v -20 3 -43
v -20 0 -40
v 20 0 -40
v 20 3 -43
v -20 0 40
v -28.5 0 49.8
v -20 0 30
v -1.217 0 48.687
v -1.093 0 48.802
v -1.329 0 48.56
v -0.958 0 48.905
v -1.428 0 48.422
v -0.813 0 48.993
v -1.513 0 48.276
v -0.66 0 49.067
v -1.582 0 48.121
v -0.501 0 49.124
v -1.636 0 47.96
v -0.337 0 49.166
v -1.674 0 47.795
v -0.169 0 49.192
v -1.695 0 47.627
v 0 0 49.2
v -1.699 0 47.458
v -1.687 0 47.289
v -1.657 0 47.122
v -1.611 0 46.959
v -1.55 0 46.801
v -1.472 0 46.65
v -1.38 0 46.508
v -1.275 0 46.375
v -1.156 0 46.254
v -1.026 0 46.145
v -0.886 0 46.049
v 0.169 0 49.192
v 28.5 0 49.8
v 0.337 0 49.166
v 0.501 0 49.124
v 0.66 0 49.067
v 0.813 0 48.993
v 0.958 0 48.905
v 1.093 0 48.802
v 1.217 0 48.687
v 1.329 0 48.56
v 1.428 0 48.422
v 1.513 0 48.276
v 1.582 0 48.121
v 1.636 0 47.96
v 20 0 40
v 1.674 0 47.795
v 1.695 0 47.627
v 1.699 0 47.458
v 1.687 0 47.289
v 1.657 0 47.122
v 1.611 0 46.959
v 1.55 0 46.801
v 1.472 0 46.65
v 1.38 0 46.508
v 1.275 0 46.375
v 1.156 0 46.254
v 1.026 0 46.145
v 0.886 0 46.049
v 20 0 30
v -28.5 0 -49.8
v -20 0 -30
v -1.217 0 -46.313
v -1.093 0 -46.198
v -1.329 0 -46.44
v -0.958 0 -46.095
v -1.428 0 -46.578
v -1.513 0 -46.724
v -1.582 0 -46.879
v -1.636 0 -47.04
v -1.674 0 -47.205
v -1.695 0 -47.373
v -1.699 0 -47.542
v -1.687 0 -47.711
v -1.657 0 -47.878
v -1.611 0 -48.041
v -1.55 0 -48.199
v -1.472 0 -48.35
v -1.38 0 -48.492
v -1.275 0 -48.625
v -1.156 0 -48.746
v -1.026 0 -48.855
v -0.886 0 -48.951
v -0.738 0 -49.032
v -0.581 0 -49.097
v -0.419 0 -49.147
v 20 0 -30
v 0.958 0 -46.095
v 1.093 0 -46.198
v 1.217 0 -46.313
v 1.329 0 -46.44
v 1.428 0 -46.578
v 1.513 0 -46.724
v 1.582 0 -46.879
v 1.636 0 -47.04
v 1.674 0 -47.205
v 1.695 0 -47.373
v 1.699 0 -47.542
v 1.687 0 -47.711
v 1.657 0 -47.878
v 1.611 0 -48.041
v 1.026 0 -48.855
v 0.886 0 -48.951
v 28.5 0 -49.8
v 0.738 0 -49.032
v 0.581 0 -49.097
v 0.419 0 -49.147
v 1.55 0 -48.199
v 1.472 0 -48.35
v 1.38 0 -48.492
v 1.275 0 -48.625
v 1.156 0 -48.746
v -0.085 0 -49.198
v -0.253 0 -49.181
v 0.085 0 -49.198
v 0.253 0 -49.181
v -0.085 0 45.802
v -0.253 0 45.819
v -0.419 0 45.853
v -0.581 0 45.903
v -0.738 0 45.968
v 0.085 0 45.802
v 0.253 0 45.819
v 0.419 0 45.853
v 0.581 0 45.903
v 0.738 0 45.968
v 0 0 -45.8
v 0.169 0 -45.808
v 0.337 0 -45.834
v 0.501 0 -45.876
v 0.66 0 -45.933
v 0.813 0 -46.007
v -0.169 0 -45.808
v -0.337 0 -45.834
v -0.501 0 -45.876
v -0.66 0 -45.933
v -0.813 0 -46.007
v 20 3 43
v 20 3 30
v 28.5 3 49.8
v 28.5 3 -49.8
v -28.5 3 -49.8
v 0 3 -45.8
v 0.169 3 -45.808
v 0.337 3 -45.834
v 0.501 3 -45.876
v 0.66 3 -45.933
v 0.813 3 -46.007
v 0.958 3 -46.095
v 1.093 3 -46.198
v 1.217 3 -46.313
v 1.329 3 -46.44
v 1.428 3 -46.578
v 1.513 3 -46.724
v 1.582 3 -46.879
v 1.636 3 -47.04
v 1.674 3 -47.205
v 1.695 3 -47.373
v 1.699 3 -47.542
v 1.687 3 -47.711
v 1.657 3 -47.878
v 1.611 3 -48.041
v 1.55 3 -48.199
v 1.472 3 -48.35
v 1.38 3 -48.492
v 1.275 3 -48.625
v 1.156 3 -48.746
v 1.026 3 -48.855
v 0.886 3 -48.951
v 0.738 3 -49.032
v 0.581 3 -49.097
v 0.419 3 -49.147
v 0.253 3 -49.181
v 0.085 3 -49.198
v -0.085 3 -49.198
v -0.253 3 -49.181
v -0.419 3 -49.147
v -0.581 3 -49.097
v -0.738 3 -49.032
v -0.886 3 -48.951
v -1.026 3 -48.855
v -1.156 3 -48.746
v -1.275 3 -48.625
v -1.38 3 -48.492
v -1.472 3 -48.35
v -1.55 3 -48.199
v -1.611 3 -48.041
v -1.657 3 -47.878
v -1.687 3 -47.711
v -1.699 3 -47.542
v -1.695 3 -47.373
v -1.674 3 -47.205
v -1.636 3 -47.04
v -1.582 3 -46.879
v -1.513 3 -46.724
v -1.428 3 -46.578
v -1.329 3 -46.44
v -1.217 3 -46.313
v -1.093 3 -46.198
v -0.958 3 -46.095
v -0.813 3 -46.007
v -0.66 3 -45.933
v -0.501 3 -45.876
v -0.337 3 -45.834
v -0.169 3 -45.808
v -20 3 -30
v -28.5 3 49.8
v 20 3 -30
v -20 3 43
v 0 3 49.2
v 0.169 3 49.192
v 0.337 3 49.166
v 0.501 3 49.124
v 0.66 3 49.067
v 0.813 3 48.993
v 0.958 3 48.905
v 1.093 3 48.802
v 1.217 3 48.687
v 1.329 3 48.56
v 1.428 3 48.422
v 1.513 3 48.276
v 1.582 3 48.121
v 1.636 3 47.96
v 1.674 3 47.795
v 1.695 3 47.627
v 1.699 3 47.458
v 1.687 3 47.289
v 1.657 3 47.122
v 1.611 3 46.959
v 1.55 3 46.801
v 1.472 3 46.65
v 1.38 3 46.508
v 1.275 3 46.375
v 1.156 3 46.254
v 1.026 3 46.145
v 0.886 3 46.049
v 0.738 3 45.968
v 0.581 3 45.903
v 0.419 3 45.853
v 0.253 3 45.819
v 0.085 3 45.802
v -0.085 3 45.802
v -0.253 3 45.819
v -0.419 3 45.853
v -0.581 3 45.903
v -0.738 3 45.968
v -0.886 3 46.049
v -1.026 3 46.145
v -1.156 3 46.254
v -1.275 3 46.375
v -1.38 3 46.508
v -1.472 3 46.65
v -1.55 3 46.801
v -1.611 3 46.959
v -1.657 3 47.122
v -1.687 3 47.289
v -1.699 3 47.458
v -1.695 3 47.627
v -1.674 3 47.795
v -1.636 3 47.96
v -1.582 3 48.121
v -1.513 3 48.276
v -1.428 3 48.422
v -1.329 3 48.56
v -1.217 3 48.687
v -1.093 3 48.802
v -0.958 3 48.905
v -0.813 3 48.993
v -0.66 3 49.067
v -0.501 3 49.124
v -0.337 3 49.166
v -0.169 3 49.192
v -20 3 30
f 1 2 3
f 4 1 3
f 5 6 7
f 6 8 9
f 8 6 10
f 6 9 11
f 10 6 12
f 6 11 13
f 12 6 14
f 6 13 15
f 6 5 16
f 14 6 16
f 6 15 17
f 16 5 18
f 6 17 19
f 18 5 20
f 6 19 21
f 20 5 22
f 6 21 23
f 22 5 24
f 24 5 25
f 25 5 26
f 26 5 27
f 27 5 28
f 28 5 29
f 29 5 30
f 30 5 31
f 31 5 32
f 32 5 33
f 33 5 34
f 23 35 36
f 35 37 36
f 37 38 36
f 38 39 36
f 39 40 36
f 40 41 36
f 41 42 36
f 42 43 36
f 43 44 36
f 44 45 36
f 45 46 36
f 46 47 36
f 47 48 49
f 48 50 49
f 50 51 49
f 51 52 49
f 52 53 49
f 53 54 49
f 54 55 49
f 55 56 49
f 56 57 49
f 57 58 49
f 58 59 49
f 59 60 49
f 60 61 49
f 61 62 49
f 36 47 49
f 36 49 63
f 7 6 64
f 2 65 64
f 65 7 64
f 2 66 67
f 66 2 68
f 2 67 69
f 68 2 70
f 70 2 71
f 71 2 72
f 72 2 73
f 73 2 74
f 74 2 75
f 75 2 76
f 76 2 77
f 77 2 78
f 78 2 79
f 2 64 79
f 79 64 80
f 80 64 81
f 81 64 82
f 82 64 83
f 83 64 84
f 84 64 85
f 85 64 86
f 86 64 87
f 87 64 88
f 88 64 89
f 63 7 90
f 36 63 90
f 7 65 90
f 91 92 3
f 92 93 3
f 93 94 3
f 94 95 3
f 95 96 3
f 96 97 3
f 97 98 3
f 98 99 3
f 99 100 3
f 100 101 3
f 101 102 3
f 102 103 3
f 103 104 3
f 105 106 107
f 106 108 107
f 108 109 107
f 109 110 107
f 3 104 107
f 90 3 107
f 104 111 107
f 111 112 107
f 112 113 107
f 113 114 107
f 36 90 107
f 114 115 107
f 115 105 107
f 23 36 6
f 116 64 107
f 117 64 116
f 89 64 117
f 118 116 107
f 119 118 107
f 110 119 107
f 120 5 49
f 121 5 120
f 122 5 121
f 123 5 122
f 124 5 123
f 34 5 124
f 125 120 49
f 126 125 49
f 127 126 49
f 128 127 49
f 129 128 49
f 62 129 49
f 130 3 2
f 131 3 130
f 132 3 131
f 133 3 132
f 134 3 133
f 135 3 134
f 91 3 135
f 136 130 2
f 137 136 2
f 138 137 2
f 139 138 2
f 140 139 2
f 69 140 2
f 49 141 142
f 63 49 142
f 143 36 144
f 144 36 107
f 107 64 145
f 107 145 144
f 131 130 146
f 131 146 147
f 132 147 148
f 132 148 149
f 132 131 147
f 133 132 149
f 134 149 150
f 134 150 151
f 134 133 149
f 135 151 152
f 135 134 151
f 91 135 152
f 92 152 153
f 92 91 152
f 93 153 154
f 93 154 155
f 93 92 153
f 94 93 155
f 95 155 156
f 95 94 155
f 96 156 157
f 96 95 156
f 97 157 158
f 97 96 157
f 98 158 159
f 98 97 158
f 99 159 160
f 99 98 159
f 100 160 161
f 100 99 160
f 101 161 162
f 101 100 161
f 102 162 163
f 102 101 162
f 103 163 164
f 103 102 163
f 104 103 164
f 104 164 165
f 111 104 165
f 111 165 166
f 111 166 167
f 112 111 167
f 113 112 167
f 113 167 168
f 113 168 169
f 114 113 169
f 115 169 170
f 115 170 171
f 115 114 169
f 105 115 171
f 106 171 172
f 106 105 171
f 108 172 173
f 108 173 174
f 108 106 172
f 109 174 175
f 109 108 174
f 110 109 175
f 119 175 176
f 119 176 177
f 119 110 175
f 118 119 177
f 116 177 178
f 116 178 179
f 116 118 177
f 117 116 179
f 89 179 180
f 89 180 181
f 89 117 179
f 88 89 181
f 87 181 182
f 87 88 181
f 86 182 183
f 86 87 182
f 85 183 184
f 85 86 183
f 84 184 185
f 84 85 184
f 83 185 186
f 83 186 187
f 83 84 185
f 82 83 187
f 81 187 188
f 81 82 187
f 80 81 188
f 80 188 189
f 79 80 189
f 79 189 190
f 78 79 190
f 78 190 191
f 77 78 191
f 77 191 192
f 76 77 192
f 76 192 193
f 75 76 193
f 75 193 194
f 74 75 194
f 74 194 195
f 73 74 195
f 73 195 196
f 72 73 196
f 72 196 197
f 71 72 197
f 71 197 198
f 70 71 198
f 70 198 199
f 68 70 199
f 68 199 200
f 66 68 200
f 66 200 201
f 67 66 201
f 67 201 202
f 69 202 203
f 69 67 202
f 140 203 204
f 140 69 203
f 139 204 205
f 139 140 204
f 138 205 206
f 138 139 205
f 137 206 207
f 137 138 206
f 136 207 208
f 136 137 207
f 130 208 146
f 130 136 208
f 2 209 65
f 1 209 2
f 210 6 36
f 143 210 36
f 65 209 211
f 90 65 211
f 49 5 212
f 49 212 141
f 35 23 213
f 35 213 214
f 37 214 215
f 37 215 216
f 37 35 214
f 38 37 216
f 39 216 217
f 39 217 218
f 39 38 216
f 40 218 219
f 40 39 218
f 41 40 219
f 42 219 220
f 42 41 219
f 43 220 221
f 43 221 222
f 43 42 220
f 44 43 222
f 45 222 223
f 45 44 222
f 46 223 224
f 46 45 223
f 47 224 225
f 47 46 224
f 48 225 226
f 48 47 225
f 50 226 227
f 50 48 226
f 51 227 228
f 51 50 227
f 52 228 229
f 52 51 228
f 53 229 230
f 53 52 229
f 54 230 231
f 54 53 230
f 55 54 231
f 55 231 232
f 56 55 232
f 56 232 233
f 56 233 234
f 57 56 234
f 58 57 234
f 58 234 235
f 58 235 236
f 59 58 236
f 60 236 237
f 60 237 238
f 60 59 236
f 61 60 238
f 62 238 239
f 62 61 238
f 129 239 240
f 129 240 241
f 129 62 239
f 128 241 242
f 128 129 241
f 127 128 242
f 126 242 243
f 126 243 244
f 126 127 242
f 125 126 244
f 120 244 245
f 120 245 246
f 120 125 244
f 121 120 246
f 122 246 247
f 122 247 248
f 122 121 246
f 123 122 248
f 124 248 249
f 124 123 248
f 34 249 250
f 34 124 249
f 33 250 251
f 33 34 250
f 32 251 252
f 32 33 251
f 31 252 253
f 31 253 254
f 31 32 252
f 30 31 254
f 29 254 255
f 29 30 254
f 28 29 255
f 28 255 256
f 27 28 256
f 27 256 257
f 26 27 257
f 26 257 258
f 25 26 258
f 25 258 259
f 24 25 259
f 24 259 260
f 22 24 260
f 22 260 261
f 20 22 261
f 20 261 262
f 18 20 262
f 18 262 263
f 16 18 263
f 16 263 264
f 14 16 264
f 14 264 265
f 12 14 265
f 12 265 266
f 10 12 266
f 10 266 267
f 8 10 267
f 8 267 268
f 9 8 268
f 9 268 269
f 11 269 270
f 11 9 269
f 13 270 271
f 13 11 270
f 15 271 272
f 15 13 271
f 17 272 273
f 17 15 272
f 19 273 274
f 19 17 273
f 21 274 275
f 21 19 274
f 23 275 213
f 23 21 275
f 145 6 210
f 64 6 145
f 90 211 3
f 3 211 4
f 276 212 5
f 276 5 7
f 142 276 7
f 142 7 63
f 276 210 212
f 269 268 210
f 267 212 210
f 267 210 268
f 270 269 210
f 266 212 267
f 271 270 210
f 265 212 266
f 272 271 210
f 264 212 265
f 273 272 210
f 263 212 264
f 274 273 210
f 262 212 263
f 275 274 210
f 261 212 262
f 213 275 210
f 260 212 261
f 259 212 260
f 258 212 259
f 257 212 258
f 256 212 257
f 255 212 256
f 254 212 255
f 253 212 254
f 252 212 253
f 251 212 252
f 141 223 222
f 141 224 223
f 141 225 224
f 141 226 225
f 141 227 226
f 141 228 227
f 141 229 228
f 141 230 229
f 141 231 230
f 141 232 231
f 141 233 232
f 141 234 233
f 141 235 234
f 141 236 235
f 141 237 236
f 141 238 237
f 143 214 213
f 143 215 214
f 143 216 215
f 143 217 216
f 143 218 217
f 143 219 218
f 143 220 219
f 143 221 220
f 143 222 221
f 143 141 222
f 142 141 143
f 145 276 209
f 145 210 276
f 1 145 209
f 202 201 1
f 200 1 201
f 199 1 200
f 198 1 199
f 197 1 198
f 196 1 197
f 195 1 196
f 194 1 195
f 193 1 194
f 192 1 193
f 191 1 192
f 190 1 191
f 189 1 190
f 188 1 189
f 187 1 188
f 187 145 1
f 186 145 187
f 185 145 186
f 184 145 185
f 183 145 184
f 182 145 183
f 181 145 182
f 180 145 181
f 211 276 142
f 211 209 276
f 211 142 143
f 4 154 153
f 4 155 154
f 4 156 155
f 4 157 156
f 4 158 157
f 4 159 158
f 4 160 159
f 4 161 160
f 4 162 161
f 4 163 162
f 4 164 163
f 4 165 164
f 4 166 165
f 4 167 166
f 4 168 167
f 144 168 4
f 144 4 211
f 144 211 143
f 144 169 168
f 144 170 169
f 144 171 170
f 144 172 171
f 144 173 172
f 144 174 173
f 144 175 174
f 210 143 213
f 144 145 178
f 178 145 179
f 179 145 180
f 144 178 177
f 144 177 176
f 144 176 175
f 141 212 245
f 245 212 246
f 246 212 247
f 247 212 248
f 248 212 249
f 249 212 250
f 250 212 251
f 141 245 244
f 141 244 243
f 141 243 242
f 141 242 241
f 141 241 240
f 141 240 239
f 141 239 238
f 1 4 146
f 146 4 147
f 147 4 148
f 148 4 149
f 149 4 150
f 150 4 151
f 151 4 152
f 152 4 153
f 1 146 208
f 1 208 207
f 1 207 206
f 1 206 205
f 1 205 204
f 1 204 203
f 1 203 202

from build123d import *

# Parameters (mm, degrees)
SKETCH_1_W          = 57
SKETCH_1_H          = 99.6
SKETCH_1_R          = 1.7
EXTRUDE_1_DEPTH     = 3
SKETCH_2_W          = 40
SKETCH_2_H          = 10
CUT_EXTRUDE_1_DEPTH = 3
CHAMFER_1_SIZE      = 3


with BuildPart() as part:
    # 草图1 → 凸台-拉伸1 (new body)
    with BuildSketch(Plane(origin=(0, 0, 0), x_dir=(1, 0, 0), z_dir=(0, 1, 0))):
        Rectangle(SKETCH_1_W, SKETCH_1_H)
        with Locations(Location((0, 47.5, 0), (0, 0, 270))):
            Circle(SKETCH_1_R, mode=Mode.SUBTRACT)
        with Locations(Location((0, -47.5, 0), (0, 0, 270))):
            Circle(SKETCH_1_R, mode=Mode.SUBTRACT)
    extrude(amount=EXTRUDE_1_DEPTH)

    # 草图2 → 切除-拉伸1 (cut)
    with BuildSketch(Plane(origin=(0, 3, 0), x_dir=(1, 0, 0), z_dir=(0, 1, 0))):
        with Locations((0, 35)):
            Rectangle(SKETCH_2_W, SKETCH_2_H)
        with Locations((0, -35)):
            Rectangle(SKETCH_2_W, SKETCH_2_H)
    extrude(amount=-CUT_EXTRUDE_1_DEPTH, mode=Mode.SUBTRACT)

    # 倒角1
    chamfer_1_edges = [part.edges().sort_by_distance(p)[0] for p in [
        (0, 3, 40),
        (0, 3, -40),
    ]]
    chamfer(chamfer_1_edges, length=CHAMFER_1_SIZE - 0.0001)  # a hair under: the kernel refuses the full size


solid = part.part
